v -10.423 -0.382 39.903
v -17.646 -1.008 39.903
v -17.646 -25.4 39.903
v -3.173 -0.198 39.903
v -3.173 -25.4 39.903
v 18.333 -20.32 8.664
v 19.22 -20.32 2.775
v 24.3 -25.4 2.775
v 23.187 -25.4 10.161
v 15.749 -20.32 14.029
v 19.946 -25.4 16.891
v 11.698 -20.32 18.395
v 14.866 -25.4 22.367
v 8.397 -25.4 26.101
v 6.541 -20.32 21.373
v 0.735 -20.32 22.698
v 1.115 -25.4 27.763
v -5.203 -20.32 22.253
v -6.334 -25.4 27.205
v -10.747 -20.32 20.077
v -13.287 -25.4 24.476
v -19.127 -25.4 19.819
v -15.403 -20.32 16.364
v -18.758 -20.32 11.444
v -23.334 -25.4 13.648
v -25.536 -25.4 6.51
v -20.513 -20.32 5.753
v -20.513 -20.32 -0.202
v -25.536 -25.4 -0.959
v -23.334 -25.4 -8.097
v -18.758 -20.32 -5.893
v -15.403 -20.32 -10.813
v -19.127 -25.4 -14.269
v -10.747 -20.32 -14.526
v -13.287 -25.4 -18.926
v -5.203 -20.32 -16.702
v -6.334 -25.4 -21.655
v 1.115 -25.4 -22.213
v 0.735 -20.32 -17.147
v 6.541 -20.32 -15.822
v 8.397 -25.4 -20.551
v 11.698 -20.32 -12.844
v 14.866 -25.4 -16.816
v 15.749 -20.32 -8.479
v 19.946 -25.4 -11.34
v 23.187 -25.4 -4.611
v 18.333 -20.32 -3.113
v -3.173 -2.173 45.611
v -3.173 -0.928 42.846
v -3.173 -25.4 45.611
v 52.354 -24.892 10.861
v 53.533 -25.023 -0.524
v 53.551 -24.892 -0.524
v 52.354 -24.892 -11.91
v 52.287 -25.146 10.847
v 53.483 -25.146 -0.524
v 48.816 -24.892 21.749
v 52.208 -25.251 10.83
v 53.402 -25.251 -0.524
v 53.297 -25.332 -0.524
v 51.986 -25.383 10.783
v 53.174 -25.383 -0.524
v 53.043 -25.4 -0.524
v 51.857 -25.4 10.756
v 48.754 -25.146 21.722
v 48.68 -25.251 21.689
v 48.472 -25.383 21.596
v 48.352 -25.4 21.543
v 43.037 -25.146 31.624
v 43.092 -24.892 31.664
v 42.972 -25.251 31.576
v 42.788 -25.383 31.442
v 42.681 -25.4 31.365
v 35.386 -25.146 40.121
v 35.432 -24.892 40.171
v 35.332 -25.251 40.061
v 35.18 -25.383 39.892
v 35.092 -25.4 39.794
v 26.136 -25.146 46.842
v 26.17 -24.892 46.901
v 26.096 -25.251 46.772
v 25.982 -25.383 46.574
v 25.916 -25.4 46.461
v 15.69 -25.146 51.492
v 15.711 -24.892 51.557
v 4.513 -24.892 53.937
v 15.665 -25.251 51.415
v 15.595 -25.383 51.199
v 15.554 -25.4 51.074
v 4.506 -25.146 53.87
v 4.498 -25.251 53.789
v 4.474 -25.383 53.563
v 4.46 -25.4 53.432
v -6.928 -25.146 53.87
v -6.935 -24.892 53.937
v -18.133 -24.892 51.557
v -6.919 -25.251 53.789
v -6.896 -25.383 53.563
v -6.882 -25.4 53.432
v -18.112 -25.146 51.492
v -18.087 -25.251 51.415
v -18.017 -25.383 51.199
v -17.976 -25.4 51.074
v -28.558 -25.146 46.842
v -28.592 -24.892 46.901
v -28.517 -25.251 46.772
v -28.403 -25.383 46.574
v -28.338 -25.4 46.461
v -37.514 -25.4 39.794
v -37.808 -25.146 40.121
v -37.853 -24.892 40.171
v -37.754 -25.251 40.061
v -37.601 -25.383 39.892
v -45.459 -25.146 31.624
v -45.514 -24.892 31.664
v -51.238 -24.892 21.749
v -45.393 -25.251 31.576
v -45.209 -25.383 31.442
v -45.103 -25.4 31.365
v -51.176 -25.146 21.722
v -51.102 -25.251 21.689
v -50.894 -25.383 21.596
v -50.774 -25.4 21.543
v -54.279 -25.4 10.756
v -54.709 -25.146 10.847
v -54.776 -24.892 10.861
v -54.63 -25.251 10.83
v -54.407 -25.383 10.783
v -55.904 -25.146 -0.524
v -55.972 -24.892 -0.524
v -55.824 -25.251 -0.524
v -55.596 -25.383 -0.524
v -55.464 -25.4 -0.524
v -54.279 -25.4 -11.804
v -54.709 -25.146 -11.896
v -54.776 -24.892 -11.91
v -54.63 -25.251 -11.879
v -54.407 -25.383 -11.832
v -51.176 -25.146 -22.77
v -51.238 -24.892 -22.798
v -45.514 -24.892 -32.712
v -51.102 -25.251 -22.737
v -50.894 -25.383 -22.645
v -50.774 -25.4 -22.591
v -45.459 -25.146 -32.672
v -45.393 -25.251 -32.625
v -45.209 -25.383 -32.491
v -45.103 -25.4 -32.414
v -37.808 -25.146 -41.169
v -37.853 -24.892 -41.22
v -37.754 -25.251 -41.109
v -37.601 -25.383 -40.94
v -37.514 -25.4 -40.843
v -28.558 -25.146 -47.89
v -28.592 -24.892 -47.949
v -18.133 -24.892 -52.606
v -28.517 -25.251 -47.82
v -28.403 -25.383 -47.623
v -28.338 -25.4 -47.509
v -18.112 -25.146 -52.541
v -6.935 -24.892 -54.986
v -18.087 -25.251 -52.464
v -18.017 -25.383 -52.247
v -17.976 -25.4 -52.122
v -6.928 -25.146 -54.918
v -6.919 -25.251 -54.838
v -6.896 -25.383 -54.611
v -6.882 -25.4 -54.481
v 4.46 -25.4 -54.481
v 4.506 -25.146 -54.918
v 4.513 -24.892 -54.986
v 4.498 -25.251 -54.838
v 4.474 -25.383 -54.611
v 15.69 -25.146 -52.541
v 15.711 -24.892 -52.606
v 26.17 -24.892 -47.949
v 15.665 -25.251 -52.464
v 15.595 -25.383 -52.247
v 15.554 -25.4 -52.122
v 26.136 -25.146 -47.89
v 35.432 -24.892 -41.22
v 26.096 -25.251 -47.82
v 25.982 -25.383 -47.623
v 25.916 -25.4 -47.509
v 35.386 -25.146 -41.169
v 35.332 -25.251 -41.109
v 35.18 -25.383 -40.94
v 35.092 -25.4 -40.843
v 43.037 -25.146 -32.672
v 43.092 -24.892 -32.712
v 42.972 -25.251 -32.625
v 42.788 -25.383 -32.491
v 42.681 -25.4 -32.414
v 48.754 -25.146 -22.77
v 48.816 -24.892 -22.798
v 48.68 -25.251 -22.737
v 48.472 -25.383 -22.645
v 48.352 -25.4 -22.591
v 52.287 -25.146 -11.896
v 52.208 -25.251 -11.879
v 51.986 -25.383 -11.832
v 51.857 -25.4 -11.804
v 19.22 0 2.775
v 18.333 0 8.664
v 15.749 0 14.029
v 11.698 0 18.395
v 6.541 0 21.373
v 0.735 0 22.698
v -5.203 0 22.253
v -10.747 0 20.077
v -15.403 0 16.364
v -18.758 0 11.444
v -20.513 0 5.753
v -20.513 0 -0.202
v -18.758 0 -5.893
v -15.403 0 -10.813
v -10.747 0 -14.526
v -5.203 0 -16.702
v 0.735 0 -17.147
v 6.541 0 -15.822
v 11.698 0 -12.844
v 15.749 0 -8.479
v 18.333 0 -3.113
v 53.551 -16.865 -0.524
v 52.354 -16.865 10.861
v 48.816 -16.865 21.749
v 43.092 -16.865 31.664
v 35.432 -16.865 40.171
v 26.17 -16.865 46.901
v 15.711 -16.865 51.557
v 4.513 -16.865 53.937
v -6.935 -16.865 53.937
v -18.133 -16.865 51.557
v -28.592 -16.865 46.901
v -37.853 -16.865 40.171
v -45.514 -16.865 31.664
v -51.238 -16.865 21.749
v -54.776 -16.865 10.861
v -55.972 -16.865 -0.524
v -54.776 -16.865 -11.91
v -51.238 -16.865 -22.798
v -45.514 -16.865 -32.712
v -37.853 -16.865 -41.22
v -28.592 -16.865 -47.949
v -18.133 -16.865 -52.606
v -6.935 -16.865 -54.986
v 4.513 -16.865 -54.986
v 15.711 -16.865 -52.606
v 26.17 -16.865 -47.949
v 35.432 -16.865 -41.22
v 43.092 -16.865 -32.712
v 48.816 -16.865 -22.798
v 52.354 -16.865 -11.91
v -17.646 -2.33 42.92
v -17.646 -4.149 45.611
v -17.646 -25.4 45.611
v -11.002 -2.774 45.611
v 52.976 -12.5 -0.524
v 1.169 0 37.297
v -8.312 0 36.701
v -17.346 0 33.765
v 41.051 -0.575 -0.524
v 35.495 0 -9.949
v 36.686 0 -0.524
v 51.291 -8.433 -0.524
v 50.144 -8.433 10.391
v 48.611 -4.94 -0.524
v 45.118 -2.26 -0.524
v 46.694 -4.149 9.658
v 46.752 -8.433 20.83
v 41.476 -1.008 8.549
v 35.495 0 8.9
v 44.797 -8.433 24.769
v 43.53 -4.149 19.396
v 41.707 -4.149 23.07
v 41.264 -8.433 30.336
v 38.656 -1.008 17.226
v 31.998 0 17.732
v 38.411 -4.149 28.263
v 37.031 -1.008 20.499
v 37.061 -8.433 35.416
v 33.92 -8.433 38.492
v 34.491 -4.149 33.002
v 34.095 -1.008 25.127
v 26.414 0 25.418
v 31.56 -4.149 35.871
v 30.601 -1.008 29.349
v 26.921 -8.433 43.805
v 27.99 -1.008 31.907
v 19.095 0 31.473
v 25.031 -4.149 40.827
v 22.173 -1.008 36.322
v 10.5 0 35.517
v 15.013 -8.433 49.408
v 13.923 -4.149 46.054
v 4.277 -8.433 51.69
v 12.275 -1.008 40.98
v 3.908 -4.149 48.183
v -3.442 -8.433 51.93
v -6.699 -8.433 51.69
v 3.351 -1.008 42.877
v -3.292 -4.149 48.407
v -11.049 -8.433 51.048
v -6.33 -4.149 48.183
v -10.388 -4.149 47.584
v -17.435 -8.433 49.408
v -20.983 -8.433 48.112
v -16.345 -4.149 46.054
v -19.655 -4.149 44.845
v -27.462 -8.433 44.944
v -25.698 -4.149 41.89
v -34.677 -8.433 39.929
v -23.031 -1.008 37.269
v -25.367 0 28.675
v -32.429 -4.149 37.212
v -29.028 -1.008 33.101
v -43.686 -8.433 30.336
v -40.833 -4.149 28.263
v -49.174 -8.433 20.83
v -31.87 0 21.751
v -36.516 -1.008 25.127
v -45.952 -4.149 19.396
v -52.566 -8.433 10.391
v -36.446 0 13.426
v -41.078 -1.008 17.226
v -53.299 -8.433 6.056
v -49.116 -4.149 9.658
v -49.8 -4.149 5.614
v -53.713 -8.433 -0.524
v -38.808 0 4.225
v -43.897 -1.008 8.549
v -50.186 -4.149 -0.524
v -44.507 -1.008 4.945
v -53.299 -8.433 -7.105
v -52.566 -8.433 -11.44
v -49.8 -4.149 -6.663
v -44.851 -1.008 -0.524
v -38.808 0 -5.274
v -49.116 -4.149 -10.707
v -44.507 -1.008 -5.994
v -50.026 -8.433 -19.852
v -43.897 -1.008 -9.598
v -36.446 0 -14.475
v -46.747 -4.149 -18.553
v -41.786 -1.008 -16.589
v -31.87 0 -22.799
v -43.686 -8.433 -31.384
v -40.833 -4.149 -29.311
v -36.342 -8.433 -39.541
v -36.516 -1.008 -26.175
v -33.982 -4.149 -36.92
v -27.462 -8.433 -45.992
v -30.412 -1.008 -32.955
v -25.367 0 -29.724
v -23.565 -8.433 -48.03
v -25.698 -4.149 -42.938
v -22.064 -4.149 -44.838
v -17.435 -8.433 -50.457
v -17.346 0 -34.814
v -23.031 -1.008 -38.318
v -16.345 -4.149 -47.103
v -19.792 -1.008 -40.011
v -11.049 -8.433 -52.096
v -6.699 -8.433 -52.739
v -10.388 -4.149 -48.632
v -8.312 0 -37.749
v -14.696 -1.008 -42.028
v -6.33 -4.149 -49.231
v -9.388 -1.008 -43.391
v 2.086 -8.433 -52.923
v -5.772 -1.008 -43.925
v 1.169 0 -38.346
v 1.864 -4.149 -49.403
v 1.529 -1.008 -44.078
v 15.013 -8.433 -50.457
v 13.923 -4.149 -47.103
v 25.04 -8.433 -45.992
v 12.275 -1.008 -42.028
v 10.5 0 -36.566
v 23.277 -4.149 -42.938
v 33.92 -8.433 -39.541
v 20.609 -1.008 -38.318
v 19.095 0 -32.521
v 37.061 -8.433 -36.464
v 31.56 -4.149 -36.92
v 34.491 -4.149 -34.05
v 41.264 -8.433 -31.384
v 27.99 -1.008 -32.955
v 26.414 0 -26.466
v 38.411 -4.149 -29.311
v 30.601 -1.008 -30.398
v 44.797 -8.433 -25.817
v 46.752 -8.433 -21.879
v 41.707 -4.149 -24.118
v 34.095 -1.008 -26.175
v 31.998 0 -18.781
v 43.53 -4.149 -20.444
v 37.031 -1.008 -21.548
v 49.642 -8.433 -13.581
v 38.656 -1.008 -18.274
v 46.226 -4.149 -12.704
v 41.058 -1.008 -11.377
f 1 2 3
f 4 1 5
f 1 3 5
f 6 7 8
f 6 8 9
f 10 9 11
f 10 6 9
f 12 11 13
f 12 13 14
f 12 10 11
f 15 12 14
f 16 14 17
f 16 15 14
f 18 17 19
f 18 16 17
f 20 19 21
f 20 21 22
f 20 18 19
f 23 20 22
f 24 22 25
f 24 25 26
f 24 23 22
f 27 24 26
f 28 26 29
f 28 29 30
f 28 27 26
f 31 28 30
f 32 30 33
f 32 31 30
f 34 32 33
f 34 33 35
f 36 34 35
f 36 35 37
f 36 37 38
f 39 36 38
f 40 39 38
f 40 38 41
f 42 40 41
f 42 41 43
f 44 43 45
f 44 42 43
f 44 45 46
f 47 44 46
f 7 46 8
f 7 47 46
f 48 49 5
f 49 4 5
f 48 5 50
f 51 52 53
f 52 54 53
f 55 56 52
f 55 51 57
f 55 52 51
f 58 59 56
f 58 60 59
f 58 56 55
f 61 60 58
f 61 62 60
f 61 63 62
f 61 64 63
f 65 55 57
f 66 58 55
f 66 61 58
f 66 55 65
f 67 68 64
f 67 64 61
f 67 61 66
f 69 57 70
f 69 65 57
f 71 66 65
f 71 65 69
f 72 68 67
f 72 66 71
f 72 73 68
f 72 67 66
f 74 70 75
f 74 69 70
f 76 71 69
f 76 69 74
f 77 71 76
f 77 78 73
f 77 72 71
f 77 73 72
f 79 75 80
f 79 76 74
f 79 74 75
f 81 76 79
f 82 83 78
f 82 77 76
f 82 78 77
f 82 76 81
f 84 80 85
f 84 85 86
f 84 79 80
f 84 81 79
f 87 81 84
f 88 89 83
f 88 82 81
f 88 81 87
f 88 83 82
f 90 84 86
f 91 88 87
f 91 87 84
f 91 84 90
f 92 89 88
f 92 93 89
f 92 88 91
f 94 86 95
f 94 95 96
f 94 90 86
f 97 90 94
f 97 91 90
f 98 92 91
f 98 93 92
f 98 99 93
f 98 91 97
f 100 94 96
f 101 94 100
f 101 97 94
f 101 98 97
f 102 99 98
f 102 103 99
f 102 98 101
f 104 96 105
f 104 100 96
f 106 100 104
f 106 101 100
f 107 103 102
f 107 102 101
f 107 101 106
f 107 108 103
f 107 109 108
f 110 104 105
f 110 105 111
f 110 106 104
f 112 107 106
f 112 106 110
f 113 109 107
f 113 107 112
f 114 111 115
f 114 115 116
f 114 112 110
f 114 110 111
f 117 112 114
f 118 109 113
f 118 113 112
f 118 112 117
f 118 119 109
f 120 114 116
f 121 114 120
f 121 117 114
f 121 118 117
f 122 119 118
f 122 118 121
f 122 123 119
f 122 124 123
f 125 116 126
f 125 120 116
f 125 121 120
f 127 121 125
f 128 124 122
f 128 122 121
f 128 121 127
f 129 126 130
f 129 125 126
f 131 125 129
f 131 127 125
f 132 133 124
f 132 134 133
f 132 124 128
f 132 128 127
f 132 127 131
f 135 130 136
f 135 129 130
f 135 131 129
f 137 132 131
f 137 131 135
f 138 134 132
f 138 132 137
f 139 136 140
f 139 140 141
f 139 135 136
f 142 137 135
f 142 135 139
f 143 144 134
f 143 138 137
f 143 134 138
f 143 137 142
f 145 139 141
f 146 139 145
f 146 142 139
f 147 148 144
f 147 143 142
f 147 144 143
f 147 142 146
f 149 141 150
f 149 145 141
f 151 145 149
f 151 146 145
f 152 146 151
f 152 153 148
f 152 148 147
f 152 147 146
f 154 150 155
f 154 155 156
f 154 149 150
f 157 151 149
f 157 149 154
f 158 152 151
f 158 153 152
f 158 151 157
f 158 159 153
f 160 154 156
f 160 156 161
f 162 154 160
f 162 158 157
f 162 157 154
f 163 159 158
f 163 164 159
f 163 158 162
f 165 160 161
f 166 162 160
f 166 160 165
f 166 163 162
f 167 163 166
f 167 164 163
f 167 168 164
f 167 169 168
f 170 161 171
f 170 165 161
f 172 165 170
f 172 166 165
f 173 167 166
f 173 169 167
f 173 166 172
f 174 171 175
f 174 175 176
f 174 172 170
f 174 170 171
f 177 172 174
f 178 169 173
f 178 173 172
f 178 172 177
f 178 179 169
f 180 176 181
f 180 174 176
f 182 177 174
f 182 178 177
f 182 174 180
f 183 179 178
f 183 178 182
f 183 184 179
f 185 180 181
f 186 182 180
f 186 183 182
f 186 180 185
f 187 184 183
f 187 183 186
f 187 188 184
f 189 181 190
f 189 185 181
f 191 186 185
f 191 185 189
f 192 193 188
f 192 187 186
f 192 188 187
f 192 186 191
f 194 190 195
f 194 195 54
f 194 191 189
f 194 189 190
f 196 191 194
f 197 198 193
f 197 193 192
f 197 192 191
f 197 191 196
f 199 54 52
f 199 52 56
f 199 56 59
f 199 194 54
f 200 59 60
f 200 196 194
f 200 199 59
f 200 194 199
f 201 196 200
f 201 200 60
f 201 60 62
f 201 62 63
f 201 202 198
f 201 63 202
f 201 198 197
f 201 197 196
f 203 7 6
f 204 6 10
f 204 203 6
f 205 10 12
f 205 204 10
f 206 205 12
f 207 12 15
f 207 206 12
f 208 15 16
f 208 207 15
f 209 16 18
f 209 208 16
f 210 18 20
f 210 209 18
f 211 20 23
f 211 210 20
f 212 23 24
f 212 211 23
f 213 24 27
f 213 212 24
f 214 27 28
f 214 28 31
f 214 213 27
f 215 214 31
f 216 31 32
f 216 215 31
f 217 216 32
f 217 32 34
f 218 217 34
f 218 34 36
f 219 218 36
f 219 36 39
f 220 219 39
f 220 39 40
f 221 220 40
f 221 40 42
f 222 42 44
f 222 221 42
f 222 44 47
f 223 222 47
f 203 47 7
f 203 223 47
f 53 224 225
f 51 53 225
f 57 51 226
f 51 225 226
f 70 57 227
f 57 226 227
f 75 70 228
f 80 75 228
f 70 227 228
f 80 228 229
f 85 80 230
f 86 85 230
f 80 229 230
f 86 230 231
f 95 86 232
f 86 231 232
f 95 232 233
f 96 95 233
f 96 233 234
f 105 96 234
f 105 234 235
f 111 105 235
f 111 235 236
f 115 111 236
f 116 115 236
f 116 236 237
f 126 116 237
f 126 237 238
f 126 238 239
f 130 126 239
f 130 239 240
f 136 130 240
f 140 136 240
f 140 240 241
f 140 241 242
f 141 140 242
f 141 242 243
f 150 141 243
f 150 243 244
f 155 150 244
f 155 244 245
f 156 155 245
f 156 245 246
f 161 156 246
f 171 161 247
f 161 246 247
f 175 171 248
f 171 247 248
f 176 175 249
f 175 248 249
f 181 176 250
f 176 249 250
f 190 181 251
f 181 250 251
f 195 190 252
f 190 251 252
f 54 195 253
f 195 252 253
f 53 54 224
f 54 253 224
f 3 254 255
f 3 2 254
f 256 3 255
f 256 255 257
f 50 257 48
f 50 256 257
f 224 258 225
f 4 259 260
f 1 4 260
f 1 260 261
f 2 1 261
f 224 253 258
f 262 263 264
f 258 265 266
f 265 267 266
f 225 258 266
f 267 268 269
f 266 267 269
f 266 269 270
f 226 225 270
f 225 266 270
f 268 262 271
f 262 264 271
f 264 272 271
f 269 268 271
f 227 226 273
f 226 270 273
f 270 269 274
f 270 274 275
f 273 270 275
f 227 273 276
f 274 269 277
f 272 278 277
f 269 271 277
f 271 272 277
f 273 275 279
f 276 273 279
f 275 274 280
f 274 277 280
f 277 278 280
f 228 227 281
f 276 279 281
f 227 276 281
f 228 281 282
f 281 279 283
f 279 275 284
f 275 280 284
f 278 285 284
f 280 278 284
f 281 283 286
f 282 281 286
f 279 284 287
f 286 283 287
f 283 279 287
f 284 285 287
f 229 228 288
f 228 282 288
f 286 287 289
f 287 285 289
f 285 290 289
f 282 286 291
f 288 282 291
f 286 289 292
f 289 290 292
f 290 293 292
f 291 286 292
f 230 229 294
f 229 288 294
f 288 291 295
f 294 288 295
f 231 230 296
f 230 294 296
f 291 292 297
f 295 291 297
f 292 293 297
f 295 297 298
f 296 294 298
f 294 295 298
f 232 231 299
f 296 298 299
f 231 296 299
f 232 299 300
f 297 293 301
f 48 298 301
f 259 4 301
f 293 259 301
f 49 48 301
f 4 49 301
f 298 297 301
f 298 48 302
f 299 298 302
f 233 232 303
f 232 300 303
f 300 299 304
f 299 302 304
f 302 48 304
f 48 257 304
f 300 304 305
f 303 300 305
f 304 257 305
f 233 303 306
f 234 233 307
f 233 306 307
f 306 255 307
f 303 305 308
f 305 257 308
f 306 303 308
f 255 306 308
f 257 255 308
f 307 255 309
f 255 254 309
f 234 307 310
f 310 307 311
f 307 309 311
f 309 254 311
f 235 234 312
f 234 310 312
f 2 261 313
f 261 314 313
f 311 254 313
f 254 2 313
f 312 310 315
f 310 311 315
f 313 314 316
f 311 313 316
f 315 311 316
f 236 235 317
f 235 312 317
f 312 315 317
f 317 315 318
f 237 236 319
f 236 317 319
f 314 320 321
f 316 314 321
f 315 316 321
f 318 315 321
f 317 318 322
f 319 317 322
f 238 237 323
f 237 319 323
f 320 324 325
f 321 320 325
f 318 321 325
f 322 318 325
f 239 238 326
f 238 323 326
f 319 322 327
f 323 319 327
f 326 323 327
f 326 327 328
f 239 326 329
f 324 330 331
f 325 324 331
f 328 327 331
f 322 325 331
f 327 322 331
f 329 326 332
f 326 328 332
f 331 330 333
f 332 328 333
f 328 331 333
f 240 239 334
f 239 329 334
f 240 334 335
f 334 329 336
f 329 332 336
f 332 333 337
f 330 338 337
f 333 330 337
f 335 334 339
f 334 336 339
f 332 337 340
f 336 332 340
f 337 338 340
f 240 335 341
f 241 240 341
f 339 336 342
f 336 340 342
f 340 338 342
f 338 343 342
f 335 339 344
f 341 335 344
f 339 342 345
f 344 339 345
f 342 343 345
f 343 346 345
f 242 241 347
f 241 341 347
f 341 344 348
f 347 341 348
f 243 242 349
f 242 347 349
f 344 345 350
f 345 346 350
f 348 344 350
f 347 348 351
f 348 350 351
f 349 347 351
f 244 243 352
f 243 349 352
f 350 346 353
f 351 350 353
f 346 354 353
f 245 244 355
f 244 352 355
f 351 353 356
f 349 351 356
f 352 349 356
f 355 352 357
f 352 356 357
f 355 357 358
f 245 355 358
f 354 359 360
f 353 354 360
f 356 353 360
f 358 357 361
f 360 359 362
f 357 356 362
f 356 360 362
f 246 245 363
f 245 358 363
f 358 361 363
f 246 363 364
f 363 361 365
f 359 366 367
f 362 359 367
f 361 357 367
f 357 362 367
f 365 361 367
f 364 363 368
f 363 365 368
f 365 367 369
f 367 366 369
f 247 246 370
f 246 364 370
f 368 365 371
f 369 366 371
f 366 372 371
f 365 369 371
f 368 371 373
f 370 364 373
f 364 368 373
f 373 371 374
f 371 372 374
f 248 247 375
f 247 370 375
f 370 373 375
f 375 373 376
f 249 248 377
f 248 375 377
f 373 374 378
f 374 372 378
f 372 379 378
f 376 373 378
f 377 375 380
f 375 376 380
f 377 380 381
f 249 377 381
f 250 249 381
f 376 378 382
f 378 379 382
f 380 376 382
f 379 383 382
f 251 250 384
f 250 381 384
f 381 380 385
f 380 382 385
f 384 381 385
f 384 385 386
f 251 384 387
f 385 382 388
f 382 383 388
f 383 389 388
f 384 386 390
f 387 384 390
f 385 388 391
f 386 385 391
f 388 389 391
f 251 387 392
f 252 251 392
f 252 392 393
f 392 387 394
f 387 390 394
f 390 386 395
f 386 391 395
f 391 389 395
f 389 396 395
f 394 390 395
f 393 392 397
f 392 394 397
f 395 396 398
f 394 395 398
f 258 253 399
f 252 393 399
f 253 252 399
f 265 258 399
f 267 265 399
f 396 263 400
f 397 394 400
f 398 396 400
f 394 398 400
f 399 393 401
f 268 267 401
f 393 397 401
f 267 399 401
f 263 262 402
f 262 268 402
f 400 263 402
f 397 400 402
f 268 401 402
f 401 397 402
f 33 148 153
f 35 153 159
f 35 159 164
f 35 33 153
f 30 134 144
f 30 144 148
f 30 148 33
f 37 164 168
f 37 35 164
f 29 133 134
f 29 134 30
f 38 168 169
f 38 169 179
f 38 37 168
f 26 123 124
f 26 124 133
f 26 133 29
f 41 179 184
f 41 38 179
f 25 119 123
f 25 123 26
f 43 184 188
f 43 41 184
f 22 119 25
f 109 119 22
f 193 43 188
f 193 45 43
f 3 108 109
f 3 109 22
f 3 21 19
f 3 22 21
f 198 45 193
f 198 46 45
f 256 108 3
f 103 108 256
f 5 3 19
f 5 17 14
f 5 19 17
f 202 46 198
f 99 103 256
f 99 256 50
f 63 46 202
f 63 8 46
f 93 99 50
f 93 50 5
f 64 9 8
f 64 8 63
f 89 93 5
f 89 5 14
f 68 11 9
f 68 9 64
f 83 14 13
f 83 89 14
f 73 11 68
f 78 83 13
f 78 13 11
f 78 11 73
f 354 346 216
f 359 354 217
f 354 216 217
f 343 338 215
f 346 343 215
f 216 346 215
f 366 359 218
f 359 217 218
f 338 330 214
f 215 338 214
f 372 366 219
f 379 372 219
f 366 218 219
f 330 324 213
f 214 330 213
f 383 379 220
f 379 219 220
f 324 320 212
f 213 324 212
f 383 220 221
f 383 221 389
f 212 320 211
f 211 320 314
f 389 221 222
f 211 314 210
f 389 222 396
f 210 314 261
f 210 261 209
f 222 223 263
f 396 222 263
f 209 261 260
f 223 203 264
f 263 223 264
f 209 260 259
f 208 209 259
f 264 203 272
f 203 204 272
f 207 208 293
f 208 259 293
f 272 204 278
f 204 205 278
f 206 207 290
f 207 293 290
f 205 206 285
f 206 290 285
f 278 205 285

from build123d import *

# Parameters (mm, degrees)
F0_R     = 54.7615085619
F0_R_2   = 19.9782226064
F1_DEPTH = 25.4
F2_W     = 14.4728478044
F2_H     = 5.7084001601
F3_DEPTH = 25.4
F4_R     = 0.508
F5_SIZE  = 5.08


# Not quite as in the source:
# - a fillet or chamfer that OpenCascade refuses, or shapes differently, is made with other operations: its cross-section is extruded or revolved along the edge and cut away or added


with BuildPart() as f1:
    # F0 (on Front) → F1 (new body)
    with BuildSketch(Plane.XZ):
        with Locations((-1.2108273804, -0.5243010819)):
            Circle(F0_R)
        with Locations((-0.7577873766, 2.7753412724)):
            Circle(F0_R_2, mode=Mode.SUBTRACT)
    extrude(amount=F1_DEPTH)

    # F2 (on face) → F3 (cut)
    with BuildSketch(Plane.XZ.offset(25.4)):
        with Locations((-10.4092946276, 42.7569095045)):
            Rectangle(F2_W, F2_H)
    extrude(amount=-F3_DEPTH, mode=Mode.SUBTRACT)

    # F4
    f4_edges = [f1.edges().sort_by_distance(p)[0] for p in [
        (-55.972336, -25.4, -0.524301),
    ]]
    fillet(f4_edges, radius=F4_R)

    # F5
    f5_edges = [f1.edges().sort_by_distance(p)[0] for p in [
        (-20.73601, -25.4, 2.775341),
    ]]
    chamfer(f5_edges, length=F5_SIZE)

    # F6: fillet of radius 16.8651706448 on 1 edges, made by hand

    # F6_s1 → F6_t2 (revolve, cut)
    with BuildSketch(Plane.XY.offset(-0.5243010819)):
        with BuildLine():
            ThreePointArc((53.5506811815, -16.8651706448), (48.6109870655, -4.939694116), (36.6855105367, 0))
            Line((36.6855105367, 0), (53.5506811815, 0))
            Line((53.5506811815, 0), (53.5506811815, -16.8651706448))
        make_face()
    revolve(axis=Axis((-1.2108273804, 0, -0.5243010819), (0, -1, 0)), mode=Mode.SUBTRACT)


solid = f1.part
